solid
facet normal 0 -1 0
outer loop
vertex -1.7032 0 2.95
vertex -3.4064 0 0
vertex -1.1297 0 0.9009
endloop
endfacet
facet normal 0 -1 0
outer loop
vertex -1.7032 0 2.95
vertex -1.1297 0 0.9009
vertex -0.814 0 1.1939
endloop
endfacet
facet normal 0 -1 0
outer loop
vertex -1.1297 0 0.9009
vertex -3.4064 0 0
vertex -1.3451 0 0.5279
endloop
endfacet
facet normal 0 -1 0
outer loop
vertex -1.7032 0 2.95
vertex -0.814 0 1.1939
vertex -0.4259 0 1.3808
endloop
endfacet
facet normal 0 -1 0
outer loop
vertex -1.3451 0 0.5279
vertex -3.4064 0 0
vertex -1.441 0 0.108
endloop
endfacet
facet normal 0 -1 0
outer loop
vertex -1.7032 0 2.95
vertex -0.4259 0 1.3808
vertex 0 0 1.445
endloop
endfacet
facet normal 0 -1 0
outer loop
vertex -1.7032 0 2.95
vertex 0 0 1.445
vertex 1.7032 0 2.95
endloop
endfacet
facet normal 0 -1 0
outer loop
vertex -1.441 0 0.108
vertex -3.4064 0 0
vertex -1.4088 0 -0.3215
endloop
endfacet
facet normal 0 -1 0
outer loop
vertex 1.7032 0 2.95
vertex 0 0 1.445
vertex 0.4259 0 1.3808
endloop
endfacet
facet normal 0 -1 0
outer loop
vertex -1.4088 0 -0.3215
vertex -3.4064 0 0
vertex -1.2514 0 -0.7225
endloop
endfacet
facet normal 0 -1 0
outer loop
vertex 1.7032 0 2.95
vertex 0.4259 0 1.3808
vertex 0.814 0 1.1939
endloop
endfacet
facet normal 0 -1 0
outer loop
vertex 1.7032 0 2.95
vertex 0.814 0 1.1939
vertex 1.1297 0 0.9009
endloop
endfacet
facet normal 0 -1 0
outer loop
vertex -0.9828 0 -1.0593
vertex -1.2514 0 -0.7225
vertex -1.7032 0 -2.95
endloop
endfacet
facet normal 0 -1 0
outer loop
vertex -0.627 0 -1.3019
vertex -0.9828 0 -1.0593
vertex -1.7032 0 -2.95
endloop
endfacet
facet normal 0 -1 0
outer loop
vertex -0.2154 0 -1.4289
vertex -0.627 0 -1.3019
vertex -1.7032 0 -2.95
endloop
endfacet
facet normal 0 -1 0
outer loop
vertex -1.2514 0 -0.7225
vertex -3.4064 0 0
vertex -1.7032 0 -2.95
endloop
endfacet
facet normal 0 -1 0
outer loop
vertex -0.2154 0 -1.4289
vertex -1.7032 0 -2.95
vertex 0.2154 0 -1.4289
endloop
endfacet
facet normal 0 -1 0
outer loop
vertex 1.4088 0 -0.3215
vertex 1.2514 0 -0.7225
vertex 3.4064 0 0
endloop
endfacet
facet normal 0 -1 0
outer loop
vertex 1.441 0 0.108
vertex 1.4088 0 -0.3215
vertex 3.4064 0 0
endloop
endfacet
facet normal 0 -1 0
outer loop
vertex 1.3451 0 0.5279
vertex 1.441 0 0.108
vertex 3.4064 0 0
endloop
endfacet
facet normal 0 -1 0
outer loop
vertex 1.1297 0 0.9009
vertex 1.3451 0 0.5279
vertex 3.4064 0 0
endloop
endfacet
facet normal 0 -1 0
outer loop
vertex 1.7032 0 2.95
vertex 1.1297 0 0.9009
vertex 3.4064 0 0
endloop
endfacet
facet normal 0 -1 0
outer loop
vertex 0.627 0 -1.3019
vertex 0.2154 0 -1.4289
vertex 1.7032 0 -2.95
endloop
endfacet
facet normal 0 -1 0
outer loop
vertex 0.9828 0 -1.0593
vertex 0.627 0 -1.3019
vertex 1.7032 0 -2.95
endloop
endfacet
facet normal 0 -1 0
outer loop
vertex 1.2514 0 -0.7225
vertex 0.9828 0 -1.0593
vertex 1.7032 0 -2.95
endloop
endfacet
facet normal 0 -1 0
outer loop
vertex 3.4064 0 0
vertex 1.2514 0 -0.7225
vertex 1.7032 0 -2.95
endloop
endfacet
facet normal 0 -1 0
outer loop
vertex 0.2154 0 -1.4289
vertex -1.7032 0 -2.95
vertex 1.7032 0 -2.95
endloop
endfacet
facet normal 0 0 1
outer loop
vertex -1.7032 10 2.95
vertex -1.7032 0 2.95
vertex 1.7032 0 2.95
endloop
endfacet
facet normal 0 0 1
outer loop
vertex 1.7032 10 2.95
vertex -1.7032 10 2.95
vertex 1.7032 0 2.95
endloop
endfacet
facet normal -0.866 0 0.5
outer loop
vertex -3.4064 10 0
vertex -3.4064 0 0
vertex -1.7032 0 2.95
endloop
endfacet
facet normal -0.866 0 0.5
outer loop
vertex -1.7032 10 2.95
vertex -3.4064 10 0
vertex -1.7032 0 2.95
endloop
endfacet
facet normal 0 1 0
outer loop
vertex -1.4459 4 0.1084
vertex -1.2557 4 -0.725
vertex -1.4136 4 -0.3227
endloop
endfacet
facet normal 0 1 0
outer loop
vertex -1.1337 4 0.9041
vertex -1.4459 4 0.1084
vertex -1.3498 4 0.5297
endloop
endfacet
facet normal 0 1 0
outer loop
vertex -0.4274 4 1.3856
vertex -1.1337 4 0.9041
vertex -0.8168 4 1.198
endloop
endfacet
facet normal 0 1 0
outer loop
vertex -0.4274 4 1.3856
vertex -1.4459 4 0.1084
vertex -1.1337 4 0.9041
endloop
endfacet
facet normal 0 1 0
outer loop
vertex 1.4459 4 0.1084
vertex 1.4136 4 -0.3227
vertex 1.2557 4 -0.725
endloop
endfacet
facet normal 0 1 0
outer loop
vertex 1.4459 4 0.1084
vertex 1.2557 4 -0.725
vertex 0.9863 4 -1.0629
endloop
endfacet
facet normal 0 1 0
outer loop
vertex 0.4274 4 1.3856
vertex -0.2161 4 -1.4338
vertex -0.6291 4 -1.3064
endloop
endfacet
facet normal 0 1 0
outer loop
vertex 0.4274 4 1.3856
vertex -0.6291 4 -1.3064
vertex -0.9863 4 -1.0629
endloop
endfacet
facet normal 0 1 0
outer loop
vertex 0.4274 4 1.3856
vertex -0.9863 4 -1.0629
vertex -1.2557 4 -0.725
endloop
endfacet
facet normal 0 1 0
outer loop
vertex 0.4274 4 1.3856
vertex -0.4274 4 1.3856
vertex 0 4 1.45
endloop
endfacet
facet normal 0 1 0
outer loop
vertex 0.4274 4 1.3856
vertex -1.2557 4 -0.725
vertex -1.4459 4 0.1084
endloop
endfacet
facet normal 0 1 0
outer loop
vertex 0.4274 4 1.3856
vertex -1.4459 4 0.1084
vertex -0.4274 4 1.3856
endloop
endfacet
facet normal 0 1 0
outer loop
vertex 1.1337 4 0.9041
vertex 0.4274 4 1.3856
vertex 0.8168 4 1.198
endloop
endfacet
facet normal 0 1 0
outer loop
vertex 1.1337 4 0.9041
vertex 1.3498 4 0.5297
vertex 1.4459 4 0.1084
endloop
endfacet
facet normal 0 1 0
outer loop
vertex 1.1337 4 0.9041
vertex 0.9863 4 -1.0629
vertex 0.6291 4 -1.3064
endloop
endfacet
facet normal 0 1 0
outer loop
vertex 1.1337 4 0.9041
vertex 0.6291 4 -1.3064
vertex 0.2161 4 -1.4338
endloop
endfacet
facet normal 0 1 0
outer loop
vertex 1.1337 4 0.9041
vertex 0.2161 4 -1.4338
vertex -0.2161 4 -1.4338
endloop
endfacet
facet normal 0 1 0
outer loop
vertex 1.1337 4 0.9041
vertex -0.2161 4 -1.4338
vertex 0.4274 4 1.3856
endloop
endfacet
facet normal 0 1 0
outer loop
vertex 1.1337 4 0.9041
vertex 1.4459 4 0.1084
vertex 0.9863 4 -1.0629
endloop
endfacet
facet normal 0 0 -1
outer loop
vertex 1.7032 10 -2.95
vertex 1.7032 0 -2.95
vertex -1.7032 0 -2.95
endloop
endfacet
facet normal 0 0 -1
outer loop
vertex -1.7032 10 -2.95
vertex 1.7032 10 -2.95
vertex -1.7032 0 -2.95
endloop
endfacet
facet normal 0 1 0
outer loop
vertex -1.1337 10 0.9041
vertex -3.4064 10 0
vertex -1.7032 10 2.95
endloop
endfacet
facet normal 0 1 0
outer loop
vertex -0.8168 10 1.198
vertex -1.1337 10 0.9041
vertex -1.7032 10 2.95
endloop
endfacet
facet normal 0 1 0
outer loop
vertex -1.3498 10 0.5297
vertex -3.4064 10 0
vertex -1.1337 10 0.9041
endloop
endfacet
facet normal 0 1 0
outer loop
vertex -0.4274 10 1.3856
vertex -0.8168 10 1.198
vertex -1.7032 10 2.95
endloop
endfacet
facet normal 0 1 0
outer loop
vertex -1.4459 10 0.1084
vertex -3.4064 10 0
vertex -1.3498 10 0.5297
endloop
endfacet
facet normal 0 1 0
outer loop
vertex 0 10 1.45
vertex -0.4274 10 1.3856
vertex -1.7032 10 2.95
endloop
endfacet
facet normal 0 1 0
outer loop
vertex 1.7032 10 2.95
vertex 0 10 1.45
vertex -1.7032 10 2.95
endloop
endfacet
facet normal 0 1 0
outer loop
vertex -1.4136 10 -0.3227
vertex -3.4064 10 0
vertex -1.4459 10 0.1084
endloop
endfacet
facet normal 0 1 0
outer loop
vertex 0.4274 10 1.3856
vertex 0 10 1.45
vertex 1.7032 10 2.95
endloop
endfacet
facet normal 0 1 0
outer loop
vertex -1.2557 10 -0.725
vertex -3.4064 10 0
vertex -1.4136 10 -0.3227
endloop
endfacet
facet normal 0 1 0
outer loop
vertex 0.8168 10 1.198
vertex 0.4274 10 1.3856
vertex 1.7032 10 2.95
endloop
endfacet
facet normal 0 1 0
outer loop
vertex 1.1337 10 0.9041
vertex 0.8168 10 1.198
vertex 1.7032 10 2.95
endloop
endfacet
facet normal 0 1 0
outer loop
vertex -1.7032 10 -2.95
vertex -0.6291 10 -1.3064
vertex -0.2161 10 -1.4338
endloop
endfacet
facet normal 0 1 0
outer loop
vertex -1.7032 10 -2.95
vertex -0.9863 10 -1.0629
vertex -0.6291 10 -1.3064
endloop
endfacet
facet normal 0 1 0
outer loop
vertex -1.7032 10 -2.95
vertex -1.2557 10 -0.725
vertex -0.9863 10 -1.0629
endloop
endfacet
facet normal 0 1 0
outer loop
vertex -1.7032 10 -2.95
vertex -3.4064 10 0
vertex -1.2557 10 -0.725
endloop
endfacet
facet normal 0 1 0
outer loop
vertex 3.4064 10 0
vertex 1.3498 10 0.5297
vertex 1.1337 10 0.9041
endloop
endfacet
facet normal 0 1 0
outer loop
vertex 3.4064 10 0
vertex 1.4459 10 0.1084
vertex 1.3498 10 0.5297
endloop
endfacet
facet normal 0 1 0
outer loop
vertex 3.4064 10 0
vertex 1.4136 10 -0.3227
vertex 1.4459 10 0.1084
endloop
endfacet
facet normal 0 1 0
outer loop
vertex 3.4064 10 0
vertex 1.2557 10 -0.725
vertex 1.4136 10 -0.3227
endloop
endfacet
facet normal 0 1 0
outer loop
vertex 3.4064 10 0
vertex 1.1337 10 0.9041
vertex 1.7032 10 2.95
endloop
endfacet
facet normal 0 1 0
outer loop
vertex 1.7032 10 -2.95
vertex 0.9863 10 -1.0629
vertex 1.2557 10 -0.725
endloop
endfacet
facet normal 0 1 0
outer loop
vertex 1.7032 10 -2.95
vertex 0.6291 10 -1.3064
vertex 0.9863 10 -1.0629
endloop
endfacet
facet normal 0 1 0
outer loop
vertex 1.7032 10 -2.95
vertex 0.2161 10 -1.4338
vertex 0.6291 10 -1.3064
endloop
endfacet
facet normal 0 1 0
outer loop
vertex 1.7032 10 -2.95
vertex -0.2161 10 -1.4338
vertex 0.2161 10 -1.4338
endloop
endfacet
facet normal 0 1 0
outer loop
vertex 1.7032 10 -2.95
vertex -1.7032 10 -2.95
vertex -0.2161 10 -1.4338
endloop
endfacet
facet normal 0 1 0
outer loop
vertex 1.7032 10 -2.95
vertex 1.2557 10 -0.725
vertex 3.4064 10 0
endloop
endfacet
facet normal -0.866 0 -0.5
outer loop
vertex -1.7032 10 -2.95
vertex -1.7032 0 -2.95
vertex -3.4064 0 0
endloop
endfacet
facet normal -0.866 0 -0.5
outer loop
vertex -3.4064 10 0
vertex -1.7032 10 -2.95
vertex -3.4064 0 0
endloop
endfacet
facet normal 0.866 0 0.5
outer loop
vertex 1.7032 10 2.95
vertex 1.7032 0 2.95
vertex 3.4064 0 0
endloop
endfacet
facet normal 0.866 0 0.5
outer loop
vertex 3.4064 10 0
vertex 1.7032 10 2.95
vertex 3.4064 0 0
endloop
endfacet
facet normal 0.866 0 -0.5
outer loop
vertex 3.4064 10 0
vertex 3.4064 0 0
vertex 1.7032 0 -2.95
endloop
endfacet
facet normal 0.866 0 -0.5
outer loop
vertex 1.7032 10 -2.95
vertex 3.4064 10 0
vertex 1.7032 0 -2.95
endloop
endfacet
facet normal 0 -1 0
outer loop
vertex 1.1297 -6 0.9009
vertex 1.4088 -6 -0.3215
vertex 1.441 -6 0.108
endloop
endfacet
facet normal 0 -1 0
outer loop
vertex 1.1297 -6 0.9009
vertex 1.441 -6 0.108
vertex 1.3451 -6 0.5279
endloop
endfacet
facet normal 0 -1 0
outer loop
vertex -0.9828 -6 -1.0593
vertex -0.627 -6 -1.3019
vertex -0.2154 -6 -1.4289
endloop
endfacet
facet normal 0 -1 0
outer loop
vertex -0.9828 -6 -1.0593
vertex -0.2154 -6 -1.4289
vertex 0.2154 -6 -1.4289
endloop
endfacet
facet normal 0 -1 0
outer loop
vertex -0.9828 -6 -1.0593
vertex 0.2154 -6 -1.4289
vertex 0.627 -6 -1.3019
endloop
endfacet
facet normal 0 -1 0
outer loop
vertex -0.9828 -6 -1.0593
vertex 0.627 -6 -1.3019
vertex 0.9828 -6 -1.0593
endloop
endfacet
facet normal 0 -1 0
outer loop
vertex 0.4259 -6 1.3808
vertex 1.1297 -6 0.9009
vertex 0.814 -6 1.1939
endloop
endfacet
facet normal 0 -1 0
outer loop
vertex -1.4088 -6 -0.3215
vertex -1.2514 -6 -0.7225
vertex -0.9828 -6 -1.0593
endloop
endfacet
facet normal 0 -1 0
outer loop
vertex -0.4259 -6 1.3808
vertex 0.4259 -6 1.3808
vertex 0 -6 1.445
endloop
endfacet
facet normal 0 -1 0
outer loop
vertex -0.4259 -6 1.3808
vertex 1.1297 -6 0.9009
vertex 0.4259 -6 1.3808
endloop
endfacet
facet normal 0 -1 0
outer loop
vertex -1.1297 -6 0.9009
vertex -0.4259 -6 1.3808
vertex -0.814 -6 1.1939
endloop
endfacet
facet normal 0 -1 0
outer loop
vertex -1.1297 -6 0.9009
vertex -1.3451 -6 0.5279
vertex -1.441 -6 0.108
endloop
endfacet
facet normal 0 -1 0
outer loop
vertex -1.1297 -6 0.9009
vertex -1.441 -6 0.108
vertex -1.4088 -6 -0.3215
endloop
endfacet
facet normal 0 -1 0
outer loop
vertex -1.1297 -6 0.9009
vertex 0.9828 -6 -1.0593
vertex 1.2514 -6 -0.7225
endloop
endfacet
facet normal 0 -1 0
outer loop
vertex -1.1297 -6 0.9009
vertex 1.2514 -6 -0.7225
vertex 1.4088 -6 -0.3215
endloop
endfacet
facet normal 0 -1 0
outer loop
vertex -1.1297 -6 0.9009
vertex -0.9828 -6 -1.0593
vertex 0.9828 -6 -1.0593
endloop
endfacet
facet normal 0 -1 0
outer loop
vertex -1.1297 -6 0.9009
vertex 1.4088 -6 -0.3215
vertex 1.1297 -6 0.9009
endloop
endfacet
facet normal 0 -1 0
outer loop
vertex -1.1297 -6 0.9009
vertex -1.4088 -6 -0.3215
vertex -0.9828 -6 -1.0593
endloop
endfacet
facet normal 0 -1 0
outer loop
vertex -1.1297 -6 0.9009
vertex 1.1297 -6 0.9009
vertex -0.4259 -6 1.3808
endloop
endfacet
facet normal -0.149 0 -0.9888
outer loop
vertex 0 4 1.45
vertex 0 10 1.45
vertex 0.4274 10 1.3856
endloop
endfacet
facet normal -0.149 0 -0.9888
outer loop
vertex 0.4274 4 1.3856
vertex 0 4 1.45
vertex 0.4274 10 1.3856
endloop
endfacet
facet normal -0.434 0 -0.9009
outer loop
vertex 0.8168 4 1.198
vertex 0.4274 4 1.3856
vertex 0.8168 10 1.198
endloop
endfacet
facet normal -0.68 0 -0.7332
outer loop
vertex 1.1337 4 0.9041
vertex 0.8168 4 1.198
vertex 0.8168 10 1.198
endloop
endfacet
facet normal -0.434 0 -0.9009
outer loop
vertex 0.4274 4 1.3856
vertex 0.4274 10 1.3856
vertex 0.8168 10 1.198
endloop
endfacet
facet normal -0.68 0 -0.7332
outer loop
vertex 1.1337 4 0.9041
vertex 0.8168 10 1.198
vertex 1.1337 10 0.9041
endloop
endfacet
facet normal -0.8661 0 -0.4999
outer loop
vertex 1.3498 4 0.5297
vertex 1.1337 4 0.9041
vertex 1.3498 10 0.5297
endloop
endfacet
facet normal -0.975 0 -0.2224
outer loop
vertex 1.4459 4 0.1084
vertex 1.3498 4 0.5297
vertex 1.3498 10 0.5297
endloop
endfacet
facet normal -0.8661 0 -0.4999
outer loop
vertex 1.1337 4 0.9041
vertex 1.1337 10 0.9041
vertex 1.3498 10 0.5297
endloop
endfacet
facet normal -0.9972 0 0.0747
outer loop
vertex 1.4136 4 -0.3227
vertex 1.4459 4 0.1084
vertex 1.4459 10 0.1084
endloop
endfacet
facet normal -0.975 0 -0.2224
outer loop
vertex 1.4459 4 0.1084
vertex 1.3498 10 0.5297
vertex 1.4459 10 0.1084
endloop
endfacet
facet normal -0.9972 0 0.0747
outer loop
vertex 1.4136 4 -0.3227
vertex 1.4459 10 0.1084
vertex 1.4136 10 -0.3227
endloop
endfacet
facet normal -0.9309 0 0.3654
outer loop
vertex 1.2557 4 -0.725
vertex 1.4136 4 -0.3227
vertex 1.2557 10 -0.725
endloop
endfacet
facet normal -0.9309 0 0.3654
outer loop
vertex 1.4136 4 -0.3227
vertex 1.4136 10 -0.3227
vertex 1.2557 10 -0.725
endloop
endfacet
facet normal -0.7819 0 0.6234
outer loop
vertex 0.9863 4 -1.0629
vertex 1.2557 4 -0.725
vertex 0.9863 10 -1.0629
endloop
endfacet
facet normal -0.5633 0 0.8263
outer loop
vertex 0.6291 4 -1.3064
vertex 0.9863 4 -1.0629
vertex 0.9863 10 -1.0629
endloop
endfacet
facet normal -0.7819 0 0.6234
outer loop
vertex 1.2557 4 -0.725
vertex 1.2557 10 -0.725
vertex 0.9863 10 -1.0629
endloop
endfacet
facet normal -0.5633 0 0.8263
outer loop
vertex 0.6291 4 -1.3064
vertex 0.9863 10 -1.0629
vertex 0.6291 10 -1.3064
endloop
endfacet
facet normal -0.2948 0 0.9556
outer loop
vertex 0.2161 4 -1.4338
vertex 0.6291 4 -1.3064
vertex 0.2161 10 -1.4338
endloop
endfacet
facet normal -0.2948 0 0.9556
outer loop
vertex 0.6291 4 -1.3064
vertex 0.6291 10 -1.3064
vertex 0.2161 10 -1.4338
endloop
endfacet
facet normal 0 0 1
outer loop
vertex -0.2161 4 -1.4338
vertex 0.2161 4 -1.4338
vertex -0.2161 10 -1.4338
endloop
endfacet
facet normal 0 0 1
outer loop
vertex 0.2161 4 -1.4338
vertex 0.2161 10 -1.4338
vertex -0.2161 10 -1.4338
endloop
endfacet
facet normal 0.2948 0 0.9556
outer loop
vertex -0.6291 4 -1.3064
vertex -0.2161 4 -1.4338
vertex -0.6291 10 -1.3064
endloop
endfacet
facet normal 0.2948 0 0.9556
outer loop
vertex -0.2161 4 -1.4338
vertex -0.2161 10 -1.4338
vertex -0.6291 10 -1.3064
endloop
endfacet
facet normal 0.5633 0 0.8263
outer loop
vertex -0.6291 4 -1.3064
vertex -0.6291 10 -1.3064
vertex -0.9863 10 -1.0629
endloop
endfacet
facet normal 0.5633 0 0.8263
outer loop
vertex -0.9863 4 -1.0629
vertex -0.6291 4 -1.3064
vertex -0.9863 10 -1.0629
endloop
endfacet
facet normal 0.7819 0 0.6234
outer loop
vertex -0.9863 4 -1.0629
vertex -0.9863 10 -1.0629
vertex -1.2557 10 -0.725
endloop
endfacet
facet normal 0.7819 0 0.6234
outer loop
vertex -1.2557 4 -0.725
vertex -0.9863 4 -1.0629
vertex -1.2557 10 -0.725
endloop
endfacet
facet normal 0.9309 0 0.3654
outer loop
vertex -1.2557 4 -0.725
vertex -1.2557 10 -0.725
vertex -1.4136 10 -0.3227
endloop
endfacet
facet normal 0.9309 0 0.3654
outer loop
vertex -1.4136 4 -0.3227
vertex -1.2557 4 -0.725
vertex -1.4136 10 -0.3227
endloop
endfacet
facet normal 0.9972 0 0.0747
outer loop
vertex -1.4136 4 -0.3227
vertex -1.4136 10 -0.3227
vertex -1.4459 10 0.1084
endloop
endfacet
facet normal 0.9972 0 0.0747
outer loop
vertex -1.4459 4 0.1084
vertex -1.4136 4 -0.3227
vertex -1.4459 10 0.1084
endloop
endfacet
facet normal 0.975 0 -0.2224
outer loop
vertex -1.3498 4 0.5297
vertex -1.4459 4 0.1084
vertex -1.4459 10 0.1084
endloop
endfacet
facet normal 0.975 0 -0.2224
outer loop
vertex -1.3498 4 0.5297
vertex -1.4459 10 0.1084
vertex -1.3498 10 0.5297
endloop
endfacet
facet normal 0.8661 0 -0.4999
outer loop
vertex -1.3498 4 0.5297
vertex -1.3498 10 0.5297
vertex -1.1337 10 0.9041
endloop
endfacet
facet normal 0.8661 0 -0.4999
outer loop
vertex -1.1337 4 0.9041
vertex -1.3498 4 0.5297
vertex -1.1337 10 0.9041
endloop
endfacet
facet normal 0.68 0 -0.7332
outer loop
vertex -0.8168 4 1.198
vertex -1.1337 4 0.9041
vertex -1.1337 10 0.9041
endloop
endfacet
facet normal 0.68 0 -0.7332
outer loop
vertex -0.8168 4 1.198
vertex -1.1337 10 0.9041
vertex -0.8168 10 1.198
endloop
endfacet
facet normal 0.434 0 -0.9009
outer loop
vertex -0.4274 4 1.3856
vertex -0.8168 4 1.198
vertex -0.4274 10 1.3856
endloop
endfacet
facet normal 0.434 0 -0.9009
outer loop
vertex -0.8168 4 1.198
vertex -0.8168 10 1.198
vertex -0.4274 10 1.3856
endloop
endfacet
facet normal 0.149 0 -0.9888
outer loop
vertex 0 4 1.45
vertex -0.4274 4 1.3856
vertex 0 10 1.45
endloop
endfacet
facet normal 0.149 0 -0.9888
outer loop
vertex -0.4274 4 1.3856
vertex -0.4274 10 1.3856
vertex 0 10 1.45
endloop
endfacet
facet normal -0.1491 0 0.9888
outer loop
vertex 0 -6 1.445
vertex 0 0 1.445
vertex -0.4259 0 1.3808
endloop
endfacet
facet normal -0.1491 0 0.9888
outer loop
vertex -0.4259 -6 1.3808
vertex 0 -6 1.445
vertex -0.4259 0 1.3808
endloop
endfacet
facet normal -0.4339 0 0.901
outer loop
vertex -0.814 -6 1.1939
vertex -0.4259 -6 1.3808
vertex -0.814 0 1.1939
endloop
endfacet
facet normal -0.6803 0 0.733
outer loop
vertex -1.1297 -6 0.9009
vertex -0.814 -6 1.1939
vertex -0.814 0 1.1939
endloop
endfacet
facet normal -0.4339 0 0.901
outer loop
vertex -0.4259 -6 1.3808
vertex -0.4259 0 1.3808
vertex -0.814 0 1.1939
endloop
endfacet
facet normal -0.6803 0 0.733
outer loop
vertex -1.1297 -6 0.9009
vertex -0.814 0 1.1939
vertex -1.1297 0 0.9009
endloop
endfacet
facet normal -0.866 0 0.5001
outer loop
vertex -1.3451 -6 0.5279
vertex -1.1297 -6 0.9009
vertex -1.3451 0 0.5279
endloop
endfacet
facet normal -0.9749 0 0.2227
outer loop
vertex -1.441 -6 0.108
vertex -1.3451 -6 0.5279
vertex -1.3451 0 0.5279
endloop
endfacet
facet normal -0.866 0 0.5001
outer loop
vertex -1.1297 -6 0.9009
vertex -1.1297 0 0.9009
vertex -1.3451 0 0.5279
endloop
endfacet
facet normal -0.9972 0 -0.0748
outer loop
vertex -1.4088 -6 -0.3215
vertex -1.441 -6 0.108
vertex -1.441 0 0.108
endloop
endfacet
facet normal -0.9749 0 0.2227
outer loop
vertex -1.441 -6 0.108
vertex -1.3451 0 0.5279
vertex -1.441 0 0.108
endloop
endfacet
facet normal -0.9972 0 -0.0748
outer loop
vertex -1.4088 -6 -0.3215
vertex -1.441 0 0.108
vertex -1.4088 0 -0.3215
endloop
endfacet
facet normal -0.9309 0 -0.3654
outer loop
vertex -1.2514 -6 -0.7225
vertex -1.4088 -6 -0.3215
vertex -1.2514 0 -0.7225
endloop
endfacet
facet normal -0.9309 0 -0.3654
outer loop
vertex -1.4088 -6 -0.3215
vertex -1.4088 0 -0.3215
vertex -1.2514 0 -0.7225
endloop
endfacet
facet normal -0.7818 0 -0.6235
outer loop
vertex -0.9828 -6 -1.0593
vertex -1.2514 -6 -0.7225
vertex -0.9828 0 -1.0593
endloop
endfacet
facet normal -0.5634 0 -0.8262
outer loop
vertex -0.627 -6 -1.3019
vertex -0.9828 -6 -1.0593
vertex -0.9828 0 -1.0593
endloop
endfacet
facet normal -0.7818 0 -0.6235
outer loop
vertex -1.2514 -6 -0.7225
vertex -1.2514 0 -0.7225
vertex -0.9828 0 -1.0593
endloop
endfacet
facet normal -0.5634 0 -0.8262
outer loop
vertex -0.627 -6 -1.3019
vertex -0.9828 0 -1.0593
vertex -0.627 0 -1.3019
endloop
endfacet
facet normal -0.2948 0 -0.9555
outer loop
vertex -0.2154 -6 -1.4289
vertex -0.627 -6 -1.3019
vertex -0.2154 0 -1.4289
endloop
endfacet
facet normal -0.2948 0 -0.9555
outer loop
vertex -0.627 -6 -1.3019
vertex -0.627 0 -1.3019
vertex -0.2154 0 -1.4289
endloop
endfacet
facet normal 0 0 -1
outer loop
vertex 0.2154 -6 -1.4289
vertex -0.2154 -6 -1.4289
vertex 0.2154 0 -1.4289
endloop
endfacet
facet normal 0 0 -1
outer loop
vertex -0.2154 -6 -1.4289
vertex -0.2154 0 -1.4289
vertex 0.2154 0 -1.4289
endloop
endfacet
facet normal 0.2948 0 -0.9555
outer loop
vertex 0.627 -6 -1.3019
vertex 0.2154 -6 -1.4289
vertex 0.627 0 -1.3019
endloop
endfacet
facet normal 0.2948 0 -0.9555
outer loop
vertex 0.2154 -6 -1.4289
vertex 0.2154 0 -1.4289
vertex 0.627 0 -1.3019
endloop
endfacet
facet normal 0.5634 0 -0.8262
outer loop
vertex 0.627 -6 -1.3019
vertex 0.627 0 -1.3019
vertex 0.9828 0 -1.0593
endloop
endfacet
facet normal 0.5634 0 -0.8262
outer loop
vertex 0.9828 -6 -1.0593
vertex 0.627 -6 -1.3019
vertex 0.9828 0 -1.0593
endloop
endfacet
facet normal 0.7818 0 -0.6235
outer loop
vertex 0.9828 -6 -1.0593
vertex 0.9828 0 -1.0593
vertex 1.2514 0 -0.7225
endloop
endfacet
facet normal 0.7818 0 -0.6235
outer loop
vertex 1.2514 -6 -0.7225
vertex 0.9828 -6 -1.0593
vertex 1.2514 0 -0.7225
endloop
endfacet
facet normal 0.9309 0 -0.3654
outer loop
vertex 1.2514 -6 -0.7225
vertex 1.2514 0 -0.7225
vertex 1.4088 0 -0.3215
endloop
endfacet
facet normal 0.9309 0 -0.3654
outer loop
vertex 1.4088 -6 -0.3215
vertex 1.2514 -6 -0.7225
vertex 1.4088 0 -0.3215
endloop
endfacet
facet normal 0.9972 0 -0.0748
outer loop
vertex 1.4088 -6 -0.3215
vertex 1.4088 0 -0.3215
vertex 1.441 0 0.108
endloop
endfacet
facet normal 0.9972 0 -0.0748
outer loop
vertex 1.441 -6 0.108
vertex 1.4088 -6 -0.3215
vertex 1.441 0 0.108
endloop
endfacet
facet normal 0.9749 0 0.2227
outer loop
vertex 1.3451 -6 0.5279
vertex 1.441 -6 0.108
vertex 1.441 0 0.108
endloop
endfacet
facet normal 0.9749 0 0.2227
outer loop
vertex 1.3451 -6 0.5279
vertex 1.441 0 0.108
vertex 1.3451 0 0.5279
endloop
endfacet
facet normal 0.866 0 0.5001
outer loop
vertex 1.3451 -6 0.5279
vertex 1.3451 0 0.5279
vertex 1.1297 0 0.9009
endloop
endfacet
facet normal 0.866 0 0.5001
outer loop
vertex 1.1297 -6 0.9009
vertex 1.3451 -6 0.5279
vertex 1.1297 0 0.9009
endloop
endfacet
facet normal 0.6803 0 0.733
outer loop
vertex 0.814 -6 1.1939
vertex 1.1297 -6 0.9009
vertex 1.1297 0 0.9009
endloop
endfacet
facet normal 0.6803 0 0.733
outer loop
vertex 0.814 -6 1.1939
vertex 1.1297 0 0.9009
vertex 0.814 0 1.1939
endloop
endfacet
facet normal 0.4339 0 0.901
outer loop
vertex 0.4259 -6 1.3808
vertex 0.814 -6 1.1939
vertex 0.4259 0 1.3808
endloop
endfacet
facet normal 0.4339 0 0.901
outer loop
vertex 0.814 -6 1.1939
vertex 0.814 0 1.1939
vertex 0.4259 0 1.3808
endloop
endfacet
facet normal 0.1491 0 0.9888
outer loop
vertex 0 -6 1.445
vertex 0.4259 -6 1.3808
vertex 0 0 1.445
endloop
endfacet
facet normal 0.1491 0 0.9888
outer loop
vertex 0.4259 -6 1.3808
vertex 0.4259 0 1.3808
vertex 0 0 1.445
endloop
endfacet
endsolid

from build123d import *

# Parameters (mm, degrees)
BOSS_EXTRUDE1_DEPTH = 10
SKETCH2_R           = 1.445
BOSS_EXTRUDE2_DEPTH = 6
SKETCH4_R           = 1.45
CUT_EXTRUDE1_DEPTH  = 6


with BuildPart() as part:
    # Sketch1 → Boss-Extrude1 (new body)
    with BuildSketch(Plane(origin=(0, 0, 0), x_dir=(1, 0, 0), z_dir=(0, 1, 0))):
        Polygon((3.406366588, 0), (1.703183294, 2.95), (-1.703183294, 2.95), (-3.406366588, 0), (-1.703183294, -2.95), (1.703183294, -2.95), align=None)
    extrude(amount=BOSS_EXTRUDE1_DEPTH)

    # Sketch2 → Boss-Extrude2 (add)
    with BuildSketch(Plane.XZ):
        with Locations(Location((0, 0, 0), (0, 0, 90))):
            Circle(SKETCH2_R)
    extrude(amount=BOSS_EXTRUDE2_DEPTH)

    # Sketch4 → Cut-Extrude1 (cut)
    with BuildSketch(Plane(origin=(0, 10, 0), x_dir=(1, 0, 0), z_dir=(0, 1, 0))):
        with Locations(Location((0, 0, 0), (0, 0, 270))):
            Circle(SKETCH4_R)
    extrude(amount=-CUT_EXTRUDE1_DEPTH, mode=Mode.SUBTRACT)


solid = part.part
